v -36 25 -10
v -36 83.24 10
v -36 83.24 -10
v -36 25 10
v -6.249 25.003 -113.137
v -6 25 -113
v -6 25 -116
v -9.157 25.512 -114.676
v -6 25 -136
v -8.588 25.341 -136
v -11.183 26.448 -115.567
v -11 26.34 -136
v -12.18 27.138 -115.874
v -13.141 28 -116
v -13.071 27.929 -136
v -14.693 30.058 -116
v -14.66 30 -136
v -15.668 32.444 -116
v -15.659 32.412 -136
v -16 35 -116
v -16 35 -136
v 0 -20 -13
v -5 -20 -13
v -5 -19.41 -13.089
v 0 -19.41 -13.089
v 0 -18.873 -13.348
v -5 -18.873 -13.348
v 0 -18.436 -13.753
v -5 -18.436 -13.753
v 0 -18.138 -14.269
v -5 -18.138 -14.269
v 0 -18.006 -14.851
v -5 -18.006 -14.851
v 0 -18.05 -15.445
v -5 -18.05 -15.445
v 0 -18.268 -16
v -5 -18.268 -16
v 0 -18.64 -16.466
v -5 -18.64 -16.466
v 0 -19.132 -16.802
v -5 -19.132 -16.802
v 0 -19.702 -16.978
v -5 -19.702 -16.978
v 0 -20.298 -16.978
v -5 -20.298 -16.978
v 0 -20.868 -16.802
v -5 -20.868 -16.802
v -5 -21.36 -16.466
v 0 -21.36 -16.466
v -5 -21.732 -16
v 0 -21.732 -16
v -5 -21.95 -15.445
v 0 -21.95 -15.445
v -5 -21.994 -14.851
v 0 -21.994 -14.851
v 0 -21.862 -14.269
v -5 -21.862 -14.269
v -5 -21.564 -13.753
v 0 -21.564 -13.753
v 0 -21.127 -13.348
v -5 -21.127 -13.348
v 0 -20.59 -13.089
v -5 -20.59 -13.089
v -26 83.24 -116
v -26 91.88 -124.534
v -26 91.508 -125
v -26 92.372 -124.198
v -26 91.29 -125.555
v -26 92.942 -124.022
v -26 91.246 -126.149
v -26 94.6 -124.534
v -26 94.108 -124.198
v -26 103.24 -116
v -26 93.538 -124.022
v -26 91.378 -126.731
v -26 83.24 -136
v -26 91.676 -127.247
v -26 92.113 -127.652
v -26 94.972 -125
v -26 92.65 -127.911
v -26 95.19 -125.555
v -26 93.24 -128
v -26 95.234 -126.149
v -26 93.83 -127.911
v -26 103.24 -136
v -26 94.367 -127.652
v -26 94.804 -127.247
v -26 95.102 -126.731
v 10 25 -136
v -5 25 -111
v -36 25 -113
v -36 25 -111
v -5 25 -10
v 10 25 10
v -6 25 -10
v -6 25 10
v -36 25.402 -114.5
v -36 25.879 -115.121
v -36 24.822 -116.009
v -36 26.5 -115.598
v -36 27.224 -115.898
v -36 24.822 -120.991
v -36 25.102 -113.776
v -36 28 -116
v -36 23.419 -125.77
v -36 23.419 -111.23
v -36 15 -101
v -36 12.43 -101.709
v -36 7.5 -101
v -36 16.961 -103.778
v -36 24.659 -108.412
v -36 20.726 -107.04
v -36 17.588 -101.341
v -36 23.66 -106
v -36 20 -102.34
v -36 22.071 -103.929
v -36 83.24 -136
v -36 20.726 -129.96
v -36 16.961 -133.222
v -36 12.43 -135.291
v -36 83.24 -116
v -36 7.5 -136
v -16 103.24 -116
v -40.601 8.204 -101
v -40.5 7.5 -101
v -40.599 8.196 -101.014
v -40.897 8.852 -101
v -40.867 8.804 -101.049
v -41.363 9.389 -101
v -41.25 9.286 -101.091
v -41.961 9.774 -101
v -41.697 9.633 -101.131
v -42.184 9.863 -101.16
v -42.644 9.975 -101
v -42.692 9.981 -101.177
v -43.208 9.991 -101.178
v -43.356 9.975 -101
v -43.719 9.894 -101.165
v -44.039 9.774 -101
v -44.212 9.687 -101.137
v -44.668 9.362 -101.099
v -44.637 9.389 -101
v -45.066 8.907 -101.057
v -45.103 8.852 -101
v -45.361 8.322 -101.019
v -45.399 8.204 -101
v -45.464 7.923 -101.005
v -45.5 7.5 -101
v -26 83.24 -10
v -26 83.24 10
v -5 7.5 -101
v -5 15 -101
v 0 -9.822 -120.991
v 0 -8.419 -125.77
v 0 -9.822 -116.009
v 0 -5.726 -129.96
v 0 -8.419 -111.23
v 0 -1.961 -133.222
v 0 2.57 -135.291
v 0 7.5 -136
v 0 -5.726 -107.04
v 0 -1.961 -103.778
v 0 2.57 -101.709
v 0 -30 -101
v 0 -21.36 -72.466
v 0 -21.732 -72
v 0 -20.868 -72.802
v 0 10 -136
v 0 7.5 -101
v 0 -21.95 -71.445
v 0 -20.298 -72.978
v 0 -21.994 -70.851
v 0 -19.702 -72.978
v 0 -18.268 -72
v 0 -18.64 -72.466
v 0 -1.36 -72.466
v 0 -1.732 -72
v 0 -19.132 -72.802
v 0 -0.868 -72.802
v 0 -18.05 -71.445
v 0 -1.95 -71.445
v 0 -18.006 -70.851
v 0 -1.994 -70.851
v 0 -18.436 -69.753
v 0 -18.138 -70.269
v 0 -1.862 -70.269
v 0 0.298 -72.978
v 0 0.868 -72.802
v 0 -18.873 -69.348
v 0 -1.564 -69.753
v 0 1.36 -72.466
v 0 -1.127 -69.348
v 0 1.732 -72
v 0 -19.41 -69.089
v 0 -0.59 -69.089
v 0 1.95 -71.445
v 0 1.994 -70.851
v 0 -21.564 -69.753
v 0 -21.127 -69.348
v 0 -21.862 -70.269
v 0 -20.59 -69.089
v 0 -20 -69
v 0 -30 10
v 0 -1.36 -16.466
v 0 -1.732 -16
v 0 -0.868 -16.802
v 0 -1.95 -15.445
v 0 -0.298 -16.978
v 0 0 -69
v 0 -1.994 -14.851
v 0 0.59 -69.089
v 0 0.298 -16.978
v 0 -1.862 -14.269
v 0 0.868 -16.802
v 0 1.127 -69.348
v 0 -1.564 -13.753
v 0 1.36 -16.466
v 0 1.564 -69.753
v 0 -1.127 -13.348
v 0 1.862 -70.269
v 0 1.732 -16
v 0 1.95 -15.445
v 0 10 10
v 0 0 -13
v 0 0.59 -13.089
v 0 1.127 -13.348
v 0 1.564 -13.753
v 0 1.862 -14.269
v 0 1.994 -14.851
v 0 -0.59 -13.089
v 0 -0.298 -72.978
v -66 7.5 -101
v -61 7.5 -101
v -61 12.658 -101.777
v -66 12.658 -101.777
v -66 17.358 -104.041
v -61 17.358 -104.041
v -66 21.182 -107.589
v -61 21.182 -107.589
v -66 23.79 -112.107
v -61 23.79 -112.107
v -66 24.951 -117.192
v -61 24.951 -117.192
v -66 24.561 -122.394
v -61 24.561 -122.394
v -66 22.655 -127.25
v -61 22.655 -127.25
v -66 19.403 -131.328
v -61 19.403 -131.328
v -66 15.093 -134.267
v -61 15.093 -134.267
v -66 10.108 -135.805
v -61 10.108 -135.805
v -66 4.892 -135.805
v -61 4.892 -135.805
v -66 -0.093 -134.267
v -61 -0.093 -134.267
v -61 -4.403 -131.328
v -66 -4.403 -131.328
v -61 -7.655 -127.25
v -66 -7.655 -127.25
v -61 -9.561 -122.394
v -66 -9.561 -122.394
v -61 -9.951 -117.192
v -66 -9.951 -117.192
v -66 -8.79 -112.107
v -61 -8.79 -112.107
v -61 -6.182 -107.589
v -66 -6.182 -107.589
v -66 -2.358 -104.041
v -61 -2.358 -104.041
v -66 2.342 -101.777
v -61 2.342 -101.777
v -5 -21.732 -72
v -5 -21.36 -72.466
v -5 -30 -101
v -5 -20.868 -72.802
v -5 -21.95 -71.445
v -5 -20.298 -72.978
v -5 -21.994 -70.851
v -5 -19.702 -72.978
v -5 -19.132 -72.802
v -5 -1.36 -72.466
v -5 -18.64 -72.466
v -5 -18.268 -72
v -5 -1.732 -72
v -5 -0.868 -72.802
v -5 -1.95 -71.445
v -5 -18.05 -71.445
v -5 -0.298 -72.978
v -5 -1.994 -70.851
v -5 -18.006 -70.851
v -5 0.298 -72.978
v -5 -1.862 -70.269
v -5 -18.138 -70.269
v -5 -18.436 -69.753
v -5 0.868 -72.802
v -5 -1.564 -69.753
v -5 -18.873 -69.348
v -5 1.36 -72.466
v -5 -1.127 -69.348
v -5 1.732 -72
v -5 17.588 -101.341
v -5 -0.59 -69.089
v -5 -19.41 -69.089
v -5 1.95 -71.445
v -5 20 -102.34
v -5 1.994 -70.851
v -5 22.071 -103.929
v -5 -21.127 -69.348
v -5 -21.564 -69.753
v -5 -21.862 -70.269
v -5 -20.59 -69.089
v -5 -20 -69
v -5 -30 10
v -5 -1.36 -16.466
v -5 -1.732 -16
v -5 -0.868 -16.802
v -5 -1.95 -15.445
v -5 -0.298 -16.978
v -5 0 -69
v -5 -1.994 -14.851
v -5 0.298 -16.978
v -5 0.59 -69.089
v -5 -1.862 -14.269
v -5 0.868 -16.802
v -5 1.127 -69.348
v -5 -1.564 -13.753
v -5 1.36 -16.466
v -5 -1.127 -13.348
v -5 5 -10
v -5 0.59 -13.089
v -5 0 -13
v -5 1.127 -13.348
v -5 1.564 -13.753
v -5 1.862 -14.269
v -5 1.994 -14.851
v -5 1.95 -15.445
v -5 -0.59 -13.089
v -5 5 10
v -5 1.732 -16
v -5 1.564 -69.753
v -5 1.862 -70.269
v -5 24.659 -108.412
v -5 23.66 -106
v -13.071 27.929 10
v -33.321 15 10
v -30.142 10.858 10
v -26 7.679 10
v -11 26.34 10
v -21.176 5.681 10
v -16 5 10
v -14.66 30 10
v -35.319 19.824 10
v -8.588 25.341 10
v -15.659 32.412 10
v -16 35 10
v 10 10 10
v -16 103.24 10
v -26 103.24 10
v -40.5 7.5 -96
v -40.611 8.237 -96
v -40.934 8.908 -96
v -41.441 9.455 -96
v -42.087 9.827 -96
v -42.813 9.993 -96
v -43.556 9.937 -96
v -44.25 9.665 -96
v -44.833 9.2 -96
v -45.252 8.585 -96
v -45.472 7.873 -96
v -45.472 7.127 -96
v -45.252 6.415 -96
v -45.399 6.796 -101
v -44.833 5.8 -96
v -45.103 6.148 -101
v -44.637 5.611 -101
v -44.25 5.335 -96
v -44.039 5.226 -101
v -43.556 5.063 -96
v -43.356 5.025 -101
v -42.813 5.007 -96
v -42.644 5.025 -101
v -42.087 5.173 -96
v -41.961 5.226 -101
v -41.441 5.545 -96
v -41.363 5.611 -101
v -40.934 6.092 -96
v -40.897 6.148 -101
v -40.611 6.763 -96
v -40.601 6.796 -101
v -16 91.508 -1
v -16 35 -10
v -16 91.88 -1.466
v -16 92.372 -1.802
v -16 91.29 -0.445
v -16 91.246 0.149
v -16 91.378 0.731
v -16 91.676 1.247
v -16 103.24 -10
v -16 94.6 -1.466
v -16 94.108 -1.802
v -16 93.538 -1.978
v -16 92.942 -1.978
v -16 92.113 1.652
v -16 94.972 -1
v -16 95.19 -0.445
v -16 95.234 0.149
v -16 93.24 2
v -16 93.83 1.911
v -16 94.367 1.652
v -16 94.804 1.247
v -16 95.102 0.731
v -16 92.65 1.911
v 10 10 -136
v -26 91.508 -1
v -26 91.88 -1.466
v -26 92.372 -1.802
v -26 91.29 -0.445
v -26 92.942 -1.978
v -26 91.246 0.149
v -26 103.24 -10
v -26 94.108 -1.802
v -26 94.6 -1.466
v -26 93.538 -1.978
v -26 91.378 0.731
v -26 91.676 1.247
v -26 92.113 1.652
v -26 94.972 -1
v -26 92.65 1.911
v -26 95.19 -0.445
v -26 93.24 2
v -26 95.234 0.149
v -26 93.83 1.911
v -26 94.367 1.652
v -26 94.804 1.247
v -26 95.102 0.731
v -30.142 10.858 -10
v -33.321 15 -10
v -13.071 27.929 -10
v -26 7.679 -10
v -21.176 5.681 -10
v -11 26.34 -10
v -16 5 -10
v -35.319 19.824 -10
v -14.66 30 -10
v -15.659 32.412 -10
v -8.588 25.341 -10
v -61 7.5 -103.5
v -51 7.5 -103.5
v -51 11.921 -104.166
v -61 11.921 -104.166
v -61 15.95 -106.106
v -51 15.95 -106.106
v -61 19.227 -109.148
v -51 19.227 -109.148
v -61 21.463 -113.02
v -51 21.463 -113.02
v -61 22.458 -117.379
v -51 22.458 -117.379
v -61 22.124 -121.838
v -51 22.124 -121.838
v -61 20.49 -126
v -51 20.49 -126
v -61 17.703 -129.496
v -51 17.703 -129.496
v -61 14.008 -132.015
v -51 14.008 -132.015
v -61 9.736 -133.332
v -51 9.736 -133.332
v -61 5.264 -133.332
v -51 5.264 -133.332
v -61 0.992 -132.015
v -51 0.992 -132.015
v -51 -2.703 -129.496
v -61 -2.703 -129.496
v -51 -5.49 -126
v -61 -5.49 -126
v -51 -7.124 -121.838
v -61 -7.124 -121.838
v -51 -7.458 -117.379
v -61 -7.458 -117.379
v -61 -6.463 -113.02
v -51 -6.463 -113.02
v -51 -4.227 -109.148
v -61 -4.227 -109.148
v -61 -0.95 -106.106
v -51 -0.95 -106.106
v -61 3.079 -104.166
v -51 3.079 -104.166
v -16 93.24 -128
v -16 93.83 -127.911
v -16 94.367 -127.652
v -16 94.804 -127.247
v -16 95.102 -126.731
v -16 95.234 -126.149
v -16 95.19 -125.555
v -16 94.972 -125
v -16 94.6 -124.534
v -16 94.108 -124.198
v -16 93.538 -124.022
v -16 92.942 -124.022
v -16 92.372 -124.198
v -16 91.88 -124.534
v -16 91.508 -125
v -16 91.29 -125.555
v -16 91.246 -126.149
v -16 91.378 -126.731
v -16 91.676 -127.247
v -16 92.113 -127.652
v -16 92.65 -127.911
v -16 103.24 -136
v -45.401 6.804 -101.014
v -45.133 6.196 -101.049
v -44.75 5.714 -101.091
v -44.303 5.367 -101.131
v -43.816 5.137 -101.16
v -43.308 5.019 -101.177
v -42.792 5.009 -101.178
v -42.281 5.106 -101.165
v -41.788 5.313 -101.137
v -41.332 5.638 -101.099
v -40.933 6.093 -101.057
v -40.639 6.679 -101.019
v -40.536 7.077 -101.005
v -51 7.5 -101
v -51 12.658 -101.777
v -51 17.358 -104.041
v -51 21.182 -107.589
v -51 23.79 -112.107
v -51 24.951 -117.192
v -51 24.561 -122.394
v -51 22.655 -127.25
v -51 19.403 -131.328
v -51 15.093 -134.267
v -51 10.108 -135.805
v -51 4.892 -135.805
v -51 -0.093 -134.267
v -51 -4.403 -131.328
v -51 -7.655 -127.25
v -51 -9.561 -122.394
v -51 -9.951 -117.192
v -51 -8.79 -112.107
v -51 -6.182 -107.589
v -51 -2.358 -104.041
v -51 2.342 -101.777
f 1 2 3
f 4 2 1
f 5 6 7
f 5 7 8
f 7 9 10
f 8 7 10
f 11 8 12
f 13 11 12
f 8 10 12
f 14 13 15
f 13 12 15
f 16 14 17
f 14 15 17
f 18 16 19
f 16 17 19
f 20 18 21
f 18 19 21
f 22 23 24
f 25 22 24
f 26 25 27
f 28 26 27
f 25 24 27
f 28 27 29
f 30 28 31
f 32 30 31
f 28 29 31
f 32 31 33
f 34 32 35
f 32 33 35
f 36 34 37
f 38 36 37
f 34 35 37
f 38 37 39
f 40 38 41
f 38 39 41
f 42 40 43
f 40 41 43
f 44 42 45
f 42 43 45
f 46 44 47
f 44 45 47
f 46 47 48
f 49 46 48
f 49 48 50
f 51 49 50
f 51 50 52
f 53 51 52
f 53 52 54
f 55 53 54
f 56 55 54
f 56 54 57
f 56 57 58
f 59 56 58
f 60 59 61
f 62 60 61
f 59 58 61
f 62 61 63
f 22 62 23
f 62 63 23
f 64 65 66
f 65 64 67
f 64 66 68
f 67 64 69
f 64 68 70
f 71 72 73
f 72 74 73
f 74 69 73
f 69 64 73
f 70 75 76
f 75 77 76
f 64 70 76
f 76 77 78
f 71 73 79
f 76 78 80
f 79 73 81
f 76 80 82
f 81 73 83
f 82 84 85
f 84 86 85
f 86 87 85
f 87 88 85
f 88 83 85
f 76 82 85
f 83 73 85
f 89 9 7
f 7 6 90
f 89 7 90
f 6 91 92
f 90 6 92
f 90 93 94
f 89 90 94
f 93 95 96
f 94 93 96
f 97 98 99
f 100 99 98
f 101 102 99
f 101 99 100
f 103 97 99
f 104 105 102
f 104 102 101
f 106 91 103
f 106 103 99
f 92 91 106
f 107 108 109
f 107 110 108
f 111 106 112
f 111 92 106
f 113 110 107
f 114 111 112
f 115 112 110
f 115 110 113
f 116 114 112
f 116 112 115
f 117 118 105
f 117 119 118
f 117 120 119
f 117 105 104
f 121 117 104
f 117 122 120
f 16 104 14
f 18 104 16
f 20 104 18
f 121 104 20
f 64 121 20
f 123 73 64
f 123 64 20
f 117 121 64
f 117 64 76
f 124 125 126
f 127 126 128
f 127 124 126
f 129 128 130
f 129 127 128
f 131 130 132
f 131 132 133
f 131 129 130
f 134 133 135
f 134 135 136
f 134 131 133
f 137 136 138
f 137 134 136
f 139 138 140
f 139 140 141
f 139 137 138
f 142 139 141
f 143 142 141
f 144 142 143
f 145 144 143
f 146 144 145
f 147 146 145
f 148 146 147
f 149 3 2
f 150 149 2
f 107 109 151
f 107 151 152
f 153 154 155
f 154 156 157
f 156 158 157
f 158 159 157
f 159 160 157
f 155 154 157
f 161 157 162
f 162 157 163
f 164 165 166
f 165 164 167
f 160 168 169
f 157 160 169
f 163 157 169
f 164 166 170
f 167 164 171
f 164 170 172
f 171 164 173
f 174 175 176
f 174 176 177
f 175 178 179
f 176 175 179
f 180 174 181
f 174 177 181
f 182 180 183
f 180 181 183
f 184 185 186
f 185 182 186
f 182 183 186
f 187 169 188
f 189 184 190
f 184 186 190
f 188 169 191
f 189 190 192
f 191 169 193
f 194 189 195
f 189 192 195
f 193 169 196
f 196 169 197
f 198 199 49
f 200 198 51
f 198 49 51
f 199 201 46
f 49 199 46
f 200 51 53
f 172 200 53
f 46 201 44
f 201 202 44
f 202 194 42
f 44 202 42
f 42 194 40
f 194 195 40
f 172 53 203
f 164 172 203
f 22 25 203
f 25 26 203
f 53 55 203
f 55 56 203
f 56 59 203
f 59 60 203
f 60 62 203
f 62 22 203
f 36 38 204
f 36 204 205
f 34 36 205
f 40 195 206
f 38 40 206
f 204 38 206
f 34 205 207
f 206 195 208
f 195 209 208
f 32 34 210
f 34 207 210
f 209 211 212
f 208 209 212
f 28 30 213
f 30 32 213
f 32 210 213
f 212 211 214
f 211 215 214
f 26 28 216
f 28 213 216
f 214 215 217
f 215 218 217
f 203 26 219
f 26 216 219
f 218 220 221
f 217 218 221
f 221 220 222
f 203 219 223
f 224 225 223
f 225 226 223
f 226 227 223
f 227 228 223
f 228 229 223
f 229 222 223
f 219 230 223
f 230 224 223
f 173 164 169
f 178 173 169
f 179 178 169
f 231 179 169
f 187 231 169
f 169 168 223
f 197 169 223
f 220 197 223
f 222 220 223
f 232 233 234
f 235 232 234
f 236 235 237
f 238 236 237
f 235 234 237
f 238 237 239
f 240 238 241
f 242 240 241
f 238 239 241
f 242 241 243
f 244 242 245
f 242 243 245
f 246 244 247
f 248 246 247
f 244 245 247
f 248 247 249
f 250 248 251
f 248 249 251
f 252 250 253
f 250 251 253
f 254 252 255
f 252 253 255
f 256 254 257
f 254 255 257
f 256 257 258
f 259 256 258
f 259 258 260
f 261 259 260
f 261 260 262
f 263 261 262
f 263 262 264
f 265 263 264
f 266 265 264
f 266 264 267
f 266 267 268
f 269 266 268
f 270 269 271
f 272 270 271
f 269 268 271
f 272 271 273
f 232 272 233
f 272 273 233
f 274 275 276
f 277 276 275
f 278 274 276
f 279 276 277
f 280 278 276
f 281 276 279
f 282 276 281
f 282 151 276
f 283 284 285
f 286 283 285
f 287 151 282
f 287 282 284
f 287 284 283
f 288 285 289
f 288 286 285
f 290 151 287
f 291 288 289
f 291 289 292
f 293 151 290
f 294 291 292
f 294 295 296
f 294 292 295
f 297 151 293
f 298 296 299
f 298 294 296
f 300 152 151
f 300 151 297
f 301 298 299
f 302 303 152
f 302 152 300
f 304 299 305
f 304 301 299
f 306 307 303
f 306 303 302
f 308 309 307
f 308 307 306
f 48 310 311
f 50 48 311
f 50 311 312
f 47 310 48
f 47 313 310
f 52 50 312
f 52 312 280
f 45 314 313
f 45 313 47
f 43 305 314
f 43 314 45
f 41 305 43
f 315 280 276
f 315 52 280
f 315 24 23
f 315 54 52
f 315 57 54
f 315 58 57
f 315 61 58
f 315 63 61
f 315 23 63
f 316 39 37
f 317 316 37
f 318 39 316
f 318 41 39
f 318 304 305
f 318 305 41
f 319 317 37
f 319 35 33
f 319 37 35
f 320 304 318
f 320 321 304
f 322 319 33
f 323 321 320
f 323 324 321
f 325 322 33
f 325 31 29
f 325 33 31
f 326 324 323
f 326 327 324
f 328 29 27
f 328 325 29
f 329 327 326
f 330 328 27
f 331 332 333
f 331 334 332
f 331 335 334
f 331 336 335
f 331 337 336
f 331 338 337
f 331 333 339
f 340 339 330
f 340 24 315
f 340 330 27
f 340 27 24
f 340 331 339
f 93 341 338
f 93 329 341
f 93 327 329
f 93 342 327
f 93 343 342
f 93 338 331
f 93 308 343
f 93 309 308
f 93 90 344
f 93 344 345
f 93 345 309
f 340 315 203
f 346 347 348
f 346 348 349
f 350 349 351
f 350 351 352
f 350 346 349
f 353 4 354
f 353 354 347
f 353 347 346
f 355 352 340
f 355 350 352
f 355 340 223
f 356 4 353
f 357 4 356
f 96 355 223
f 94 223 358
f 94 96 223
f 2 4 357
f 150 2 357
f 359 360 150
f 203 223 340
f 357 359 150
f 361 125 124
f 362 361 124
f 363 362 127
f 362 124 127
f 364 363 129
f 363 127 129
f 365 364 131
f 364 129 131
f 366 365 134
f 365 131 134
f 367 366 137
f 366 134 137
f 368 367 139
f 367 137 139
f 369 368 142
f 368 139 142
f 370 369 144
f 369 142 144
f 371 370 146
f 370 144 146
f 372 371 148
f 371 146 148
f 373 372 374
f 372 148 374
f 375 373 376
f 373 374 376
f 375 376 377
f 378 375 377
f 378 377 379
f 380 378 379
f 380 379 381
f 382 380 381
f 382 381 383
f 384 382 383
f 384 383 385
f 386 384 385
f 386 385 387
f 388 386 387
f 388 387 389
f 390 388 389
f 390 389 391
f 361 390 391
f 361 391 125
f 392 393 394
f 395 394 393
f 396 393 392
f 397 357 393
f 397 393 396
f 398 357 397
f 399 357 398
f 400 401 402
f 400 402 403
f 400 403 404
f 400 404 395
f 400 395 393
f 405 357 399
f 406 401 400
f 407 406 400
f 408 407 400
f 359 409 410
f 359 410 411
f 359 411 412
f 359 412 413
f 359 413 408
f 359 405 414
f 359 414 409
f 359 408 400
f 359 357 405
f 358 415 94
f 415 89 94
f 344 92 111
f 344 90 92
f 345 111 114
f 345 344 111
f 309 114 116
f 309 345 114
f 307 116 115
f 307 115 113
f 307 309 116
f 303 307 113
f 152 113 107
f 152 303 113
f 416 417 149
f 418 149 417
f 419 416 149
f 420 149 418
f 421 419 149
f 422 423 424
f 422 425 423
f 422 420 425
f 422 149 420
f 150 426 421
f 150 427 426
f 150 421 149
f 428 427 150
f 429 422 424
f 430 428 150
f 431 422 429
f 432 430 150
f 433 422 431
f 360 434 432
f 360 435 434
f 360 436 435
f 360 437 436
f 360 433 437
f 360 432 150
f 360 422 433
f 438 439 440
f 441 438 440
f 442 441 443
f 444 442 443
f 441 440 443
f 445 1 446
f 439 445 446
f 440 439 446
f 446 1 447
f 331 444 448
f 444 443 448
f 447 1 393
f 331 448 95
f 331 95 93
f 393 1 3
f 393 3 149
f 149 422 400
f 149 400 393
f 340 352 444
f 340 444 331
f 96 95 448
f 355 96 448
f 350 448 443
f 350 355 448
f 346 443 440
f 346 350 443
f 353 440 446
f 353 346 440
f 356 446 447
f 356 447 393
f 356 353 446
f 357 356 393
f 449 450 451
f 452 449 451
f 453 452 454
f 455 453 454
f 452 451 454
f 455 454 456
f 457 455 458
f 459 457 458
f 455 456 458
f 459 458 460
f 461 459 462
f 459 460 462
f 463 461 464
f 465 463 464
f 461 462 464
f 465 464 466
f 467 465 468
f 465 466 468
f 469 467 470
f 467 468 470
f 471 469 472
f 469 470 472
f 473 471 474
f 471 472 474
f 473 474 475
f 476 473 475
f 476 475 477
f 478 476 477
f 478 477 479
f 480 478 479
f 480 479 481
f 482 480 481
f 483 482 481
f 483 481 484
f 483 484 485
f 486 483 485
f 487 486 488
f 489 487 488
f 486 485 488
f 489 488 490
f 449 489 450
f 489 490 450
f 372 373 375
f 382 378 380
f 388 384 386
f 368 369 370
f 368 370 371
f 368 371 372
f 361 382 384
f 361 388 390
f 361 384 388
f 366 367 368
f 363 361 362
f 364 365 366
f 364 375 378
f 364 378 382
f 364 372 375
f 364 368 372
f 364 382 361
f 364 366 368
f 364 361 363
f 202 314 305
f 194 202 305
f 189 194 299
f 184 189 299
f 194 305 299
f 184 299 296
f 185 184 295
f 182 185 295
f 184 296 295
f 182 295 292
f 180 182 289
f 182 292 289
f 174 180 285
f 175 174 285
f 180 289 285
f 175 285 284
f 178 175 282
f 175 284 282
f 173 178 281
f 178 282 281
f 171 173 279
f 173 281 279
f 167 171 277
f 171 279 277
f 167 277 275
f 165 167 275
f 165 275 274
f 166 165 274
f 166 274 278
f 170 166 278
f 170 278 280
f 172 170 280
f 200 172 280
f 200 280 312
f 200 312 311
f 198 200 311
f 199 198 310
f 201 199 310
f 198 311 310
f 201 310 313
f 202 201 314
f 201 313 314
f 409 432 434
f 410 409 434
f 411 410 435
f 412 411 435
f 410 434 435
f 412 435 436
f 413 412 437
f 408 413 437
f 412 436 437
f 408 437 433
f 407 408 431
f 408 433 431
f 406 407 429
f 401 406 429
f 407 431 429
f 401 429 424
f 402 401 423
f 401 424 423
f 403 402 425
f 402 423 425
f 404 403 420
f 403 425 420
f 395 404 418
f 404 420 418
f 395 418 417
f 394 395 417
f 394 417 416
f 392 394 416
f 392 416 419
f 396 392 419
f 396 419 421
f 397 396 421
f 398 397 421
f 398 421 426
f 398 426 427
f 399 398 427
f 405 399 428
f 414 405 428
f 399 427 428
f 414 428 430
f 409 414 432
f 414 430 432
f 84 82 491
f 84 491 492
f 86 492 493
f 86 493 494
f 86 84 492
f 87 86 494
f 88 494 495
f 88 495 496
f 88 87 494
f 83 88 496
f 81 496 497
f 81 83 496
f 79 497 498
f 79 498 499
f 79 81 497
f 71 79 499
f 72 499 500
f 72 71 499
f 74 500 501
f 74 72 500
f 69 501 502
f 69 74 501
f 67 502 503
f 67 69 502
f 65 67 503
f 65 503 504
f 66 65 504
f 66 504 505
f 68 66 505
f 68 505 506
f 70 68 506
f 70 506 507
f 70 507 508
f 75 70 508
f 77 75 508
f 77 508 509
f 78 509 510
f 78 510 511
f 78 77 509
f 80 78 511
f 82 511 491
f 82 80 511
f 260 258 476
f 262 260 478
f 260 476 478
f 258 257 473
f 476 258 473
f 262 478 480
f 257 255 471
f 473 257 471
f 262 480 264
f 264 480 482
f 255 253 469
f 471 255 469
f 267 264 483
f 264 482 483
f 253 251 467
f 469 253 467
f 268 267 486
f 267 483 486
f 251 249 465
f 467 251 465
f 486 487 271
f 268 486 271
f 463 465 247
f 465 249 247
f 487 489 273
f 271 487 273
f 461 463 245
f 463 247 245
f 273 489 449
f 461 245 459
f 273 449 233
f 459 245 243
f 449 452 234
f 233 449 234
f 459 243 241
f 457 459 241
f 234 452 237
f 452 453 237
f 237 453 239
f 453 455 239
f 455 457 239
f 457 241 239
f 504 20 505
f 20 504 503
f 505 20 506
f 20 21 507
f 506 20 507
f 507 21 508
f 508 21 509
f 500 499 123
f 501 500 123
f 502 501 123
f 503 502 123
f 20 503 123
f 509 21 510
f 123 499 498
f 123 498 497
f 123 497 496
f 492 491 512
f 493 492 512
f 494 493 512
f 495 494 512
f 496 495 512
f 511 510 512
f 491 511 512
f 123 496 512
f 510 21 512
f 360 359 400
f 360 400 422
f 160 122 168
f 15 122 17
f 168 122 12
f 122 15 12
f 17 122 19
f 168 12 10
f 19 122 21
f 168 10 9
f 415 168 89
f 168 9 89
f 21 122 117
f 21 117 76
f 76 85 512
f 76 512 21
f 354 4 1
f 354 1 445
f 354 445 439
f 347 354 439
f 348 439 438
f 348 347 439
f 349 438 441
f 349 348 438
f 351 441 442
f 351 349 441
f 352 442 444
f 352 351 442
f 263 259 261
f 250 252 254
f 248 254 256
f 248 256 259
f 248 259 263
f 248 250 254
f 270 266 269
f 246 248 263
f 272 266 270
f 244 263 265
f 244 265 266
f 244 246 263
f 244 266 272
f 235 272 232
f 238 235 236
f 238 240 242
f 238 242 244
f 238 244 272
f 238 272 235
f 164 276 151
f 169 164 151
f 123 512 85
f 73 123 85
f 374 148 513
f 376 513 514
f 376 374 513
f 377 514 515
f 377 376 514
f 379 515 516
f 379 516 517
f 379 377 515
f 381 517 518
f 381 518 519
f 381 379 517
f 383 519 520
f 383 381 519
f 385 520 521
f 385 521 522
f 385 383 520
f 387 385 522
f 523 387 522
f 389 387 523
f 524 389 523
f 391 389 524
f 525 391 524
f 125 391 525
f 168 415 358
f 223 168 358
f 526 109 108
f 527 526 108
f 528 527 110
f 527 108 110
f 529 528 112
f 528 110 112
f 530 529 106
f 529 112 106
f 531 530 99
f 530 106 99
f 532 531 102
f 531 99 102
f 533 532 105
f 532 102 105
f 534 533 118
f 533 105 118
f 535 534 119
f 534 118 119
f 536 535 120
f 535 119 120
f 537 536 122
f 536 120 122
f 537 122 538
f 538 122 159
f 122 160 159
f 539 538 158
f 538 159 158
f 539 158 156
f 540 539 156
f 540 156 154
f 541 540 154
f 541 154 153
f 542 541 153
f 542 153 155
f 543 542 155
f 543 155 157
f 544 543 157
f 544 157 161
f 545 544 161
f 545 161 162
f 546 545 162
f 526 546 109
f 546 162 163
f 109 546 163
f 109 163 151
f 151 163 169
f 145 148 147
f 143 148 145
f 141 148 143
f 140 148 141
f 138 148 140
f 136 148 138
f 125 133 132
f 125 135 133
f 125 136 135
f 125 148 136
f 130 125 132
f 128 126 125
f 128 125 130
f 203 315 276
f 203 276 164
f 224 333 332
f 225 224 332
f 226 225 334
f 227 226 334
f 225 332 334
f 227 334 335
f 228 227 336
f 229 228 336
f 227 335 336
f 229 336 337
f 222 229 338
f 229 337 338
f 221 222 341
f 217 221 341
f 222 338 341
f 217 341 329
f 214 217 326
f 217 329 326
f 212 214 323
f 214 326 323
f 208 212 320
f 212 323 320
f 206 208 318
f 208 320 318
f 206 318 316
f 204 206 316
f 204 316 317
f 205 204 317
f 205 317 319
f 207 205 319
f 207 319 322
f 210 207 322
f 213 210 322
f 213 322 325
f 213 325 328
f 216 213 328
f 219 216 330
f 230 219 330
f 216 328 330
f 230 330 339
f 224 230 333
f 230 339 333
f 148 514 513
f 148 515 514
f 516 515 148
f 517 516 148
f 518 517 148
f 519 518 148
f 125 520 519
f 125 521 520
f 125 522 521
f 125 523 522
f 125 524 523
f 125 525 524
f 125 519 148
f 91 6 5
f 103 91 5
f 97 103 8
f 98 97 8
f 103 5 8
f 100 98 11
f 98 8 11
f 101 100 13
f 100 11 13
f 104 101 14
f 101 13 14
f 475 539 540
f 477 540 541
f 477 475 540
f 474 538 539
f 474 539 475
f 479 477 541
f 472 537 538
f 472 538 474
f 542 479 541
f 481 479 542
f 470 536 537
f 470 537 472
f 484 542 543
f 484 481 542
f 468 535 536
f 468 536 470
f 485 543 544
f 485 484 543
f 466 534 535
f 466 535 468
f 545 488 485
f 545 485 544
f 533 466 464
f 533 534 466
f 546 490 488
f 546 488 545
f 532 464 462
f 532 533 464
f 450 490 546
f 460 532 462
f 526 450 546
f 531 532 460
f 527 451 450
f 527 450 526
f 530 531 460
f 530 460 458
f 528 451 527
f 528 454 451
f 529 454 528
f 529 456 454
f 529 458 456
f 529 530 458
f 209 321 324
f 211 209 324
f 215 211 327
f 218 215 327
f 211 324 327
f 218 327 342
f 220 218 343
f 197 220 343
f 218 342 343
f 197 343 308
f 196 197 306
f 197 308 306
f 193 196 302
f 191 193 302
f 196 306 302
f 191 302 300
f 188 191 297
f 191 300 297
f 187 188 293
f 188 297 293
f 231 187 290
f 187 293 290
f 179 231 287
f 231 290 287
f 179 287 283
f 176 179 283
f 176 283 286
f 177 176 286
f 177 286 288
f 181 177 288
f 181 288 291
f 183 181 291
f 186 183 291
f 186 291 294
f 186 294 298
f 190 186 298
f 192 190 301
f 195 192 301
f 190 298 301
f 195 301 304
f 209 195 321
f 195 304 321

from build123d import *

# Parameters (mm, degrees)
BOSS_EXTRUDE3_DEPTH              = 10
SKETCH8_W                        = 146
SKETCH8_H                        = 15
BOSS_EXTRUDE6_DEPTH              = 5
SKETCH9_W                        = 5
SKETCH9_H                        = 146
BOSS_EXTRUDE7_DEPTH              = 20
BOSS_EXTRUDE8_DEPTH              = 20
SKETCH17_W                       = 20
SKETCH17_H                       = 20
CUT_EXTRUDE4_DEPTH               = 10
SKETCH18_R                       = 2
CUT_EXTRUDE5_DEPTH               = 10
SKETCH20_W                       = 35
SKETCH20_H                       = 35
BOSS_EXTRUDE9_DEPTH              = 31
SKETCH21_R                       = 17.5
BOSS_EXTRUDE10_DEPTH             = 30
CUT_EXTRUDE6_DEPTH               = 31
FILLET1_R                        = 3
SKETCH26_R                       = 17.5
SKETCH26_R_2                     = 15
CUT_EXTRUDE9_DEPTH               = 10
FILLET2_R                        = 10
SKETCH27_W                       = 5
SKETCH27_H                       = 146
BOSS_EXTRUDE11_DEPTH             = 20
SKETCH28_W                       = 10
SKETCH28_H                       = 126
CUT_EXTRUDE10_DEPTH              = 10
SKETCH29_R                       = 2
CUT_EXTRUDE11_DEPTH              = 5
CUT_EXTRUDE12_DEPTH              = 5
SKETCH31_R                       = 2.5
BOSS_EXTRUDE12_DEPTH             = 5
BOSS_EXTRUDE12_DIRECTION_2_REACH = 37


with BuildPart() as part:
    # Sketch4 → Boss-Extrude3 (new body)
    with BuildSketch(Plane(origin=(0, 0, 0), x_dir=(0, 0, -1), z_dir=(1, 0, 0))):
        Polygon((0, 10), (-10, 10), (-10, 25), (136, 25), (136, 10), (126, 10), (126, 0), (0, 0), align=None)
    extrude(amount=BOSS_EXTRUDE3_DEPTH)

    # Sketch8 → Boss-Extrude6 (add)
    with BuildSketch(Plane.ZY):
        with Locations((-63, 17.5)):
            Rectangle(SKETCH8_W, SKETCH8_H)
    extrude(amount=BOSS_EXTRUDE6_DEPTH)

    # Sketch9 → Boss-Extrude7 (add)
    with BuildSketch(Plane.XZ.offset(-10)):
        with Locations((-2.5, -63)):
            Rectangle(SKETCH9_W, SKETCH9_H)
    extrude(amount=BOSS_EXTRUDE7_DEPTH)

    # Sketch14 → Boss-Extrude8 (add)
    with BuildSketch(Plane.XY.offset(10)):
        with BuildLine():
            Line((-5, 25), (-6, 25))
            ThreePointArc((-6, 25), (-13.071067812, 27.928932188), (-16, 35))
            Line((-16, 35), (-16, 83.24))
            Line((-16, 83.24), (-16, 103.24))
            Line((-16, 103.24), (-36, 103.24))
            Line((-36, 103.24), (-36, 93.24))
            Line((-36, 93.24), (-36, 83.24))
            Line((-36, 83.24), (-36, 25))
            ThreePointArc((-36, 25), (-30.142135624, 10.857864376), (-16, 5))
            Line((-16, 5), (-5, 5))
            Line((-5, 5), (-5, 25))
        make_face()
    boss_extrude8 = extrude(amount=-BOSS_EXTRUDE8_DEPTH)

    # Sketch17 → Cut-Extrude4 (cut)
    with BuildSketch(Plane.ZY.offset(36)):
        with Locations((0, 93.24)):
            Rectangle(SKETCH17_W, SKETCH17_H)
    cut_extrude4 = extrude(amount=-CUT_EXTRUDE4_DEPTH, mode=Mode.SUBTRACT)

    # Sketch18 → Cut-Extrude5 (cut)
    with BuildSketch(Plane.ZY.offset(26)):
        with Locations((0, 93.24)):
            Circle(SKETCH18_R)
    cut_extrude5 = extrude(amount=-CUT_EXTRUDE5_DEPTH, mode=Mode.SUBTRACT)

    # Mirror2: Boss-Extrude8, Cut-Extrude4, Cut-Extrude5 across plane
    add(boss_extrude8.mirror(Plane.XY.offset(-63)))
    add(cut_extrude4.mirror(Plane.XY.offset(-63)), mode=Mode.SUBTRACT)
    add(cut_extrude5.mirror(Plane.XY.offset(-63)), mode=Mode.SUBTRACT)

    # Sketch20 → Boss-Extrude9 (add)
    with BuildSketch(Plane.ZY.offset(36)):
        with Locations((-118.5, 7.5)):
            Rectangle(SKETCH20_W, SKETCH20_H)
    extrude(amount=-BOSS_EXTRUDE9_DEPTH)

    # Sketch21 → Boss-Extrude10 (add)
    with BuildSketch(Plane.ZY.offset(36)):
        with Locations((-118.5, 7.5)):
            Circle(SKETCH21_R)
    extrude(amount=BOSS_EXTRUDE10_DEPTH)

    # Sketch22 → Cut-Extrude6 (cut)
    with BuildSketch(Plane.ZY.offset(36)):
        with BuildLine():
            Line((-136, 7.5), (-136, -14.77740031))
            Line((-136, -14.77740031), (-101, -14.77740031))
            Line((-101, -14.77740031), (-101, 7.5))
            ThreePointArc((-101, 7.5), (-118.5, -10), (-136, 7.5))
        make_face()
    extrude(amount=-CUT_EXTRUDE6_DEPTH, mode=Mode.SUBTRACT)

    # Fillet1
    fillet1_edges = [part.edges().sort_by_distance(p)[0] for p in [
        (-21, 25, -116),
    ]]
    fillet(fillet1_edges, radius=FILLET1_R)

    # Sketch26 → Cut-Extrude9 (cut)
    with BuildSketch(Plane.ZY.offset(51)):
        with Locations((-118.5, 7.5)):
            Circle(SKETCH26_R)
        with Locations((-118.5, 7.5)):
            Circle(SKETCH26_R_2, mode=Mode.SUBTRACT)
    extrude(amount=CUT_EXTRUDE9_DEPTH, mode=Mode.SUBTRACT)

    # Fillet2
    fillet2_edges = [part.edges().sort_by_distance(p)[0] for p in [
        (-20.5, 25, -101),
    ]]
    fillet(fillet2_edges, radius=FILLET2_R)

    # Sketch27 → Boss-Extrude11 (add)
    with BuildSketch(Plane.XZ.offset(10)):
        with Locations((-2.5, -63)):
            Rectangle(SKETCH27_W, SKETCH27_H)
    extrude(amount=BOSS_EXTRUDE11_DEPTH)

    # Sketch28 → Cut-Extrude10 (cut)
    with BuildSketch(Plane.XZ):
        with Locations((5, -63)):
            Rectangle(SKETCH28_W, SKETCH28_H)
    extrude(amount=-CUT_EXTRUDE10_DEPTH, mode=Mode.SUBTRACT)

    # Sketch29 → Cut-Extrude11 (cut)
    with BuildSketch(Plane.ZY.offset(5)):
        with Locations((-15, -20)):
            Circle(SKETCH29_R)
        with Locations((-71, -20)):
            Circle(SKETCH29_R)
        with Locations((-15, 0)):
            Circle(SKETCH29_R)
        with Locations((-71, 0)):
            Circle(SKETCH29_R)
    extrude(amount=-CUT_EXTRUDE11_DEPTH, mode=Mode.SUBTRACT)

    # Sketch30 → Cut-Extrude12 (cut)
    with BuildSketch(Plane.ZY.offset(5)):
        with BuildLine():
            Line((-136, 7.5), (-136, -30))
            Line((-136, -30), (-101, -30))
            Line((-101, -30), (-101, 7.5))
            ThreePointArc((-101, 7.5), (-118.5, -10), (-136, 7.5))
        make_face()
    extrude(amount=-CUT_EXTRUDE12_DEPTH, mode=Mode.SUBTRACT)


with BuildPart() as body_2:
    # Sketch31 → Boss-Extrude12 (new body)
    with BuildSketch(Plane.XY.offset(-101)):
        with Locations((-43, 7.5)):
            Circle(SKETCH31_R)
    extrude(amount=BOSS_EXTRUDE12_DEPTH)


    # Sketch31 → Boss-Extrude12 direction 2 (add, up to next)
    with BuildSketch(Plane.XY.offset(-101), mode=Mode.PRIVATE) as boss_extrude12_direction_2_sk1:
        with Locations((-43, 7.5)):
            Circle(SKETCH31_R)
    boss_extrude12_direction_2_tool1 = extrude(boss_extrude12_direction_2_sk1.sketch, amount=-BOSS_EXTRUDE12_DIRECTION_2_REACH, mode=Mode.PRIVATE) - part.part
    add(boss_extrude12_direction_2_tool1.solids().sort_by_distance((-43, 7.5, -101))[0])
    add(boss_extrude12_direction_2_tool1.solids().sort_by_distance((-43, 7.5, -101))[1])


solid = Compound([part.part, body_2.part])
